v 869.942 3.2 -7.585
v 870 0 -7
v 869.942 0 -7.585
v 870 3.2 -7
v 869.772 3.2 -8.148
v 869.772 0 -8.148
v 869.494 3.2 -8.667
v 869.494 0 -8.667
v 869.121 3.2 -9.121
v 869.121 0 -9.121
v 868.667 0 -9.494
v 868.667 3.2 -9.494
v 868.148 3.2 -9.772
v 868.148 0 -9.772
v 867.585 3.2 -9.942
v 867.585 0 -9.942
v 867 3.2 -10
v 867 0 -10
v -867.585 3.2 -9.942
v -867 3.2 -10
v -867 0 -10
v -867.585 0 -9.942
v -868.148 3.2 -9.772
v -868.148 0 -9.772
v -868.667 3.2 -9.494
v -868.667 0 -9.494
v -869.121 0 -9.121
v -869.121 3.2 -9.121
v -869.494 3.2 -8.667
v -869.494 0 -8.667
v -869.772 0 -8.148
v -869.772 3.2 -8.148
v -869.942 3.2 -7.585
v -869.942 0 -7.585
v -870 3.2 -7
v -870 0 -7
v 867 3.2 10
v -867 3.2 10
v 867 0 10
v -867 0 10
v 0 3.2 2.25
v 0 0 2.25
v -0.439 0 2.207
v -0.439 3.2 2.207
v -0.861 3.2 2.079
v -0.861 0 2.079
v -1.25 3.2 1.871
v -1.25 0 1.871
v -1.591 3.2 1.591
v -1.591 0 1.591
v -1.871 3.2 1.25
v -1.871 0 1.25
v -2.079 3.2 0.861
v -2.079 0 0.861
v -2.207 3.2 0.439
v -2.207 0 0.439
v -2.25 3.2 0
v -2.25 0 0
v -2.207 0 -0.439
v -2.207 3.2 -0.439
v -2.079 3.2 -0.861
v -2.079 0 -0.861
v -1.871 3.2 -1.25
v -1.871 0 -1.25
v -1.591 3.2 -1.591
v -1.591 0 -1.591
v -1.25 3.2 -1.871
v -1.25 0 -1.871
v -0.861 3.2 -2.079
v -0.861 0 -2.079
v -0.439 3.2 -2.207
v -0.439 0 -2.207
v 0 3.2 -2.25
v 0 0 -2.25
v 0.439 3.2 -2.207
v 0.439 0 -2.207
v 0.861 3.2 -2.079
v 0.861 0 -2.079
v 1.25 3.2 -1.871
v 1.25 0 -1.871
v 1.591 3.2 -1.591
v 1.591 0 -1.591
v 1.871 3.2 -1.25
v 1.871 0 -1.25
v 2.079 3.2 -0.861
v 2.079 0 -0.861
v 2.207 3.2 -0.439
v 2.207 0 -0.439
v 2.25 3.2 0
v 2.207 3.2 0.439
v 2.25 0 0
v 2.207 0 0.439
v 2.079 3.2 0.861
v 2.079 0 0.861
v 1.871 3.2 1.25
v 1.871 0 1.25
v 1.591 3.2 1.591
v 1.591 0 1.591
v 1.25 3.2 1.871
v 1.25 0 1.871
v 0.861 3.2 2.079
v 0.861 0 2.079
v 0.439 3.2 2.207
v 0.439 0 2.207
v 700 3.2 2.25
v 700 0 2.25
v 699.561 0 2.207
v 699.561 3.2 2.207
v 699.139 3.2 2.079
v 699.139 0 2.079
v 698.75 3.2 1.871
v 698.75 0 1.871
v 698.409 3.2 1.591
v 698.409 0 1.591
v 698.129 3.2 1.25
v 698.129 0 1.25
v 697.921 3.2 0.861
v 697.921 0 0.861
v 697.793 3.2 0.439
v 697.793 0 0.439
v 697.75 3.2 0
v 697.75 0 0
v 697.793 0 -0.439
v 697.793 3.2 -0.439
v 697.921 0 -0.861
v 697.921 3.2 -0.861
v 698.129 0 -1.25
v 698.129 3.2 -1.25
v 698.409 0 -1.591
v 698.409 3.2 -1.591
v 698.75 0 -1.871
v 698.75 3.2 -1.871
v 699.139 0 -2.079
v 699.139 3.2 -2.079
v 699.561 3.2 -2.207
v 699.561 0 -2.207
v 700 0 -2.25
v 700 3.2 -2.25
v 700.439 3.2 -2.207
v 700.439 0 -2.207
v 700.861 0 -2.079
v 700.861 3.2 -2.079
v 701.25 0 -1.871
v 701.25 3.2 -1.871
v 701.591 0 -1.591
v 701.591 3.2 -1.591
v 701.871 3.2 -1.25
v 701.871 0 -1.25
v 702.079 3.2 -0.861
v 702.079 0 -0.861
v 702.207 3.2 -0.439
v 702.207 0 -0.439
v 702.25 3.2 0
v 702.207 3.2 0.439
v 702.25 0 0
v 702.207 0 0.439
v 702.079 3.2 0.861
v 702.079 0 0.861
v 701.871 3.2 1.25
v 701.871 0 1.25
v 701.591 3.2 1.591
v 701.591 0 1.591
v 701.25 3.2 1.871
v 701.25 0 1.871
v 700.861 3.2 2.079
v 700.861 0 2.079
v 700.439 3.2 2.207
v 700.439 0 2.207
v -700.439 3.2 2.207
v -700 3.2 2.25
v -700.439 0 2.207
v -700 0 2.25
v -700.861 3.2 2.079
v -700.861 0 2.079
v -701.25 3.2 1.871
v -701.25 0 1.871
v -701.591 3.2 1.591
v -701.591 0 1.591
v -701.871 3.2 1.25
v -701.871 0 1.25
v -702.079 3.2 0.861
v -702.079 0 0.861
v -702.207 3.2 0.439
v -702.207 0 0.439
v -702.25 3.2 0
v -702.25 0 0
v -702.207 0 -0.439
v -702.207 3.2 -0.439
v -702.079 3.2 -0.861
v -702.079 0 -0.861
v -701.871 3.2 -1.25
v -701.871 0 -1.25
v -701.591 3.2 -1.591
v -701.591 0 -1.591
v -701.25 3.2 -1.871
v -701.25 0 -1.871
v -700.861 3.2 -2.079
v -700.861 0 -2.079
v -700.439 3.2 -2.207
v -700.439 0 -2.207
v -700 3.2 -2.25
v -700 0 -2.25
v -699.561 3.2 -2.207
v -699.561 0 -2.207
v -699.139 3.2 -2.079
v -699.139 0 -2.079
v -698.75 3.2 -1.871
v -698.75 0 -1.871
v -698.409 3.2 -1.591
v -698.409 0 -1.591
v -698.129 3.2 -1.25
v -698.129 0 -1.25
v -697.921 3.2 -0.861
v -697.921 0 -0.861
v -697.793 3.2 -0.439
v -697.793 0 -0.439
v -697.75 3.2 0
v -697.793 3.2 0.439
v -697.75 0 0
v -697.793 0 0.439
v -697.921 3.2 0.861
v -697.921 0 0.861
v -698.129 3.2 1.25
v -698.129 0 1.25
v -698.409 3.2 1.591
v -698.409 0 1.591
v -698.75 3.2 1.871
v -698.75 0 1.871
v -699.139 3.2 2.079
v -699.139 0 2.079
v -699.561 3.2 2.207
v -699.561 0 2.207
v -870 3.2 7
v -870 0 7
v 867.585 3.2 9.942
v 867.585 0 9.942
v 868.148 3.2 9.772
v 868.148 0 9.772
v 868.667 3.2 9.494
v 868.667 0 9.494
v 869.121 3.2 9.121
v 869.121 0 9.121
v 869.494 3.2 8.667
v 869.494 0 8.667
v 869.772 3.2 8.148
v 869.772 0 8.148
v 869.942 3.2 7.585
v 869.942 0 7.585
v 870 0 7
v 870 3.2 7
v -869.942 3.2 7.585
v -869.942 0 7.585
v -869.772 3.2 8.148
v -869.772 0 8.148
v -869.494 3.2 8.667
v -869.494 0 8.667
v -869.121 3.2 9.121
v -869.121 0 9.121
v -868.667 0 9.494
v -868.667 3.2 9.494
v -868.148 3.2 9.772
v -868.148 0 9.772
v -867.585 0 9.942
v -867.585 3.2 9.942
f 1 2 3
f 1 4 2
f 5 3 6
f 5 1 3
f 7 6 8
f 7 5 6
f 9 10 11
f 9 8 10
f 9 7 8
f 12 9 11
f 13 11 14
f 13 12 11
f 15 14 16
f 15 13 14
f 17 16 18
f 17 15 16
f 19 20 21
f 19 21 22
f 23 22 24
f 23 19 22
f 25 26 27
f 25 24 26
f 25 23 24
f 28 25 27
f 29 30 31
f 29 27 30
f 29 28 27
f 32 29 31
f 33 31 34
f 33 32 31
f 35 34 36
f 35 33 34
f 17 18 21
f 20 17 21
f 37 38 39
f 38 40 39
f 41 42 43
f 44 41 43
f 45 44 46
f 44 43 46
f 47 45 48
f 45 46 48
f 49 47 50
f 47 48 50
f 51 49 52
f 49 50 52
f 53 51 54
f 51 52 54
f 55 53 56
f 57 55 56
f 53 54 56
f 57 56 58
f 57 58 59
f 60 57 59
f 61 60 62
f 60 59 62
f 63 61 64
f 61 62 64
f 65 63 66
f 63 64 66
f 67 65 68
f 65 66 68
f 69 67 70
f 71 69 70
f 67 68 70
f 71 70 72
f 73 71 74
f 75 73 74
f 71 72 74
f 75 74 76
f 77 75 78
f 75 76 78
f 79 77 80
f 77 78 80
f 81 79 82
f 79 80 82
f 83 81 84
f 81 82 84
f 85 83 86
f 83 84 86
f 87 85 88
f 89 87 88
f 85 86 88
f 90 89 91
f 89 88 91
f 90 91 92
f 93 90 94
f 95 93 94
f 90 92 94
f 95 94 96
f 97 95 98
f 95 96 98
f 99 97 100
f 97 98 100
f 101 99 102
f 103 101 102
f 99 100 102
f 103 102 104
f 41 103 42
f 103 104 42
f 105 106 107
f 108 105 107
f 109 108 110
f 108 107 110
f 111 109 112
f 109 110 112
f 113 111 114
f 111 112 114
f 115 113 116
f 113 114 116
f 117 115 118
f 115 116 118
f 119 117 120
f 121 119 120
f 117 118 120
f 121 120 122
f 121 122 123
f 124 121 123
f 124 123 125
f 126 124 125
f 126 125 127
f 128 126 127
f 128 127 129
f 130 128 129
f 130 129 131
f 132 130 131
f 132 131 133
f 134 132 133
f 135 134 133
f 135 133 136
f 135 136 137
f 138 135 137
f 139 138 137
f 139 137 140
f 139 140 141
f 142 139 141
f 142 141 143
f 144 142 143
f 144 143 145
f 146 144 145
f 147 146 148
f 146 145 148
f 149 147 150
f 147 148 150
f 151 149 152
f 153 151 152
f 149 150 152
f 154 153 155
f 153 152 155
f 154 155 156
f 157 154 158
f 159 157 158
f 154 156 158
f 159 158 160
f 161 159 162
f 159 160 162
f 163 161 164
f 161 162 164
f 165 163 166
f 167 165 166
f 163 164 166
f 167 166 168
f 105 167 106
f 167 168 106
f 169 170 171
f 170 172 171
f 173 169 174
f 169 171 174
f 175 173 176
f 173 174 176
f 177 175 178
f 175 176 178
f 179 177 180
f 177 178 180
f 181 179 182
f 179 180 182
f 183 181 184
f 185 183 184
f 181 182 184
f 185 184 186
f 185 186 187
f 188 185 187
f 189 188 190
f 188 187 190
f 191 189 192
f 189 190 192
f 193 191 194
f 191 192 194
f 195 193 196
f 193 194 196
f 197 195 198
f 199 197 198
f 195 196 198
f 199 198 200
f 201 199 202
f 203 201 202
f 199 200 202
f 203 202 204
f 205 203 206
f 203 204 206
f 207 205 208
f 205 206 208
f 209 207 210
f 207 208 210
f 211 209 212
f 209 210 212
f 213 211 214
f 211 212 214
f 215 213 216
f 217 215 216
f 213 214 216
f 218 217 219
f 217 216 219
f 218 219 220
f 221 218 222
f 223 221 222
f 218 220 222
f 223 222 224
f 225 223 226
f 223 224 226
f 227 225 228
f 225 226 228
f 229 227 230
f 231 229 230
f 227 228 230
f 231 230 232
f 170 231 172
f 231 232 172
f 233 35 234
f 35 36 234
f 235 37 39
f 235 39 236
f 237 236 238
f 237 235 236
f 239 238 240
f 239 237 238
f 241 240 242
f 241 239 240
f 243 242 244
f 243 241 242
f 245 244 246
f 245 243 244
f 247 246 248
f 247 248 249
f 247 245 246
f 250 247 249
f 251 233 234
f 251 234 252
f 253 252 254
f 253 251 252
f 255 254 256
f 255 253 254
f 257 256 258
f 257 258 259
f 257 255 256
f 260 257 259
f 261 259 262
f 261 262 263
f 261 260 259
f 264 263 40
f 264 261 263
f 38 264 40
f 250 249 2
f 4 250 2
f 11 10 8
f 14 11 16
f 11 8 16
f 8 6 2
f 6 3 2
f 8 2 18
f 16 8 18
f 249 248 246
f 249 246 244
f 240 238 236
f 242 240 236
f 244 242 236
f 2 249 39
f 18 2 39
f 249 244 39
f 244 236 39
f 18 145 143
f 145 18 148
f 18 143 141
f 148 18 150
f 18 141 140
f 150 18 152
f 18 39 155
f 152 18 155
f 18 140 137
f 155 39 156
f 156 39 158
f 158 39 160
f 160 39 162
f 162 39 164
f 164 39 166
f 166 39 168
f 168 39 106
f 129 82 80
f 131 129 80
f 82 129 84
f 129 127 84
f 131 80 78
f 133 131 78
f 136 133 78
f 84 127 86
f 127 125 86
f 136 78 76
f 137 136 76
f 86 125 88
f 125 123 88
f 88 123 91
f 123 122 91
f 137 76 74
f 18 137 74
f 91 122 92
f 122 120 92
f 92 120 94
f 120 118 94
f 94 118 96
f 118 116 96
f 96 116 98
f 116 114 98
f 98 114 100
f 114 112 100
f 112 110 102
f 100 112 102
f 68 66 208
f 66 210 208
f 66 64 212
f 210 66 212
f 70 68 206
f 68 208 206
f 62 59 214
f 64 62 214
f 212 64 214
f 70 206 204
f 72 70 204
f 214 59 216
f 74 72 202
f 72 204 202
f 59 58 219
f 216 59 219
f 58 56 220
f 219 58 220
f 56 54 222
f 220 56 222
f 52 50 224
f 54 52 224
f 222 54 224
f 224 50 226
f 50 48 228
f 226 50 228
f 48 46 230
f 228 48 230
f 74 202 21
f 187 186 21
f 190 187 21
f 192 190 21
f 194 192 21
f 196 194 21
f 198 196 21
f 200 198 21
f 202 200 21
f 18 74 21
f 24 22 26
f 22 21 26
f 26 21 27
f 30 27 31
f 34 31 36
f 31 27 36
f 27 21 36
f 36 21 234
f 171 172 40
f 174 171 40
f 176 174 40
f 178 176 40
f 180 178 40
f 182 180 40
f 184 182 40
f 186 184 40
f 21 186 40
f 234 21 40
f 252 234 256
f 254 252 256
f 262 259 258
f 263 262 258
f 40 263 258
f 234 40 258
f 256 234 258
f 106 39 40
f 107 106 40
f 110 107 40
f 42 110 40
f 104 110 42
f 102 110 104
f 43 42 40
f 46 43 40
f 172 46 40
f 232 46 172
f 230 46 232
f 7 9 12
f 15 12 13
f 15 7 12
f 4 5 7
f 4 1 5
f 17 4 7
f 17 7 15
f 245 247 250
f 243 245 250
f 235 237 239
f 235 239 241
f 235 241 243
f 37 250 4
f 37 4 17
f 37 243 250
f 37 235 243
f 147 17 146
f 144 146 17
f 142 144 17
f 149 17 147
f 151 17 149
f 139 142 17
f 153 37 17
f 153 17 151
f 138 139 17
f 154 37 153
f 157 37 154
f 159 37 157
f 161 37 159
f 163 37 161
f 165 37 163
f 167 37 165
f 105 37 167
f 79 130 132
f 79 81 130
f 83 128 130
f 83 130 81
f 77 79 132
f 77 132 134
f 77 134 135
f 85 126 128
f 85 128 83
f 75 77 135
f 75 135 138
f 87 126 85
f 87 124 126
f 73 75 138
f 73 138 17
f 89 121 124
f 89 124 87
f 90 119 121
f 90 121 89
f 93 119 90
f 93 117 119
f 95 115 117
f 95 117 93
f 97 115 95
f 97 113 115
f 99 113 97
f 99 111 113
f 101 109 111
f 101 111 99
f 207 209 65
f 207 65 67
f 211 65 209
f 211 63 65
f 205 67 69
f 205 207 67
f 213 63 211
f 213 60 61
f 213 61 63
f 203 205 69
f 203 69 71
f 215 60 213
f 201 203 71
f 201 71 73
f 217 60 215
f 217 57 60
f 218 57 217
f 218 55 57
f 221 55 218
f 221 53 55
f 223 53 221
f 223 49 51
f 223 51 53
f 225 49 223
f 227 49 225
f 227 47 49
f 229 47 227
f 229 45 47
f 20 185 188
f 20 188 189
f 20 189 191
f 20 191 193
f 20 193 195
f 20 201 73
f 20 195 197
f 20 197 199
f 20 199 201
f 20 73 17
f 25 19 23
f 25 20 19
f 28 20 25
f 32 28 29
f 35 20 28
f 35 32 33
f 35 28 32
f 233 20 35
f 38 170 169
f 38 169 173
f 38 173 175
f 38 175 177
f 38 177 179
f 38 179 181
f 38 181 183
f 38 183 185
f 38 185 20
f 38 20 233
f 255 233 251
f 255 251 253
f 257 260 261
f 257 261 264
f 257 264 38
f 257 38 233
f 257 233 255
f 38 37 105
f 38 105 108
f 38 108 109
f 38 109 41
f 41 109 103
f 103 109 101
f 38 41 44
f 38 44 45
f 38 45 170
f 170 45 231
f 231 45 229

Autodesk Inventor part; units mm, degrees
ref_plane "YZ Plane" through (0, 0, 0) normal (1, 0, 0) x (0, 1, 0)
ref_plane "XZ Plane" through (0, 0, 0) normal (0, 1, 0) x (-1, 0, 0)
ref_plane "XY Plane" through (0, 0, 0) normal (0, 0, 1) x (1, 0, 0)
sketch "Sketch1" plane through (0, 0, 0) normal (0, 1, 0) x (-1, 0, 0)
  line L0 (870, 10) -> (-870, 10)
  line L1 (-870, 10) -> (-870, -10)
  line L2 (-870, -10) -> (870, -10)
  line L3 (870, -10) -> (870, 10)
  line L4 (870, 10) -> (-870, -10) construction
  line L5 (-870, 10) -> (870, -10) construction
  point P0 (0, 0)
  dimension "d0" = 1740
  dimension "d1" = 20
extrude "Plate1" add sketch "Sketch1" along normal blind 3.2
sketch "Sketch3" plane through (0, 3.2, 0) normal (0, 1, 0) x (1, 0, 0)
  line L0 (0, 0) -> (-700, 0)
  line L1 (0, 0) -> (0, 5)
  point P0 (700, 0)
  dimension "d13" = 700
  dimension "d14" = 5
hole "Hole1" at (0, 3.2, 0) at (-700, 3.2, 0) at (700, 3.2, 0) direction (0, -1, 0) diameter 4.5 depth 3.2 clearance for "Countersunk Flat Head Screw ISO 2009/7046" size "M4" standard "ISO"
fillet "Corner Round1" radius 3 4 edges at (870, 1.6, 10) (-870, 1.6, 10) (870, 1.6, -10) (-870, 1.6, -10)
equation "\"d20\" = Thickness"
equation "\"d2\" = Thickness"
equation "\"BendReliefWidth\" = Thickness"
equation "\"BendReliefDepth\" = 0.5 * Thickness"
equation "\"CornerReliefSize\" = 4 * Thickness"
equation "\"MinimumRemnant\" = 2 * Thickness"
equation "\"TransitionRadius\" = BendRadius"
equation "\"JacobiRadiusSize\" = BendRadius"
equation "\"GapSize\" = Thickness"
equation "\"Thickness\" = 3.2"
equation "\"BendRadius\" = 1.516"
properties part number "SP55V1 Chapa Guia"
